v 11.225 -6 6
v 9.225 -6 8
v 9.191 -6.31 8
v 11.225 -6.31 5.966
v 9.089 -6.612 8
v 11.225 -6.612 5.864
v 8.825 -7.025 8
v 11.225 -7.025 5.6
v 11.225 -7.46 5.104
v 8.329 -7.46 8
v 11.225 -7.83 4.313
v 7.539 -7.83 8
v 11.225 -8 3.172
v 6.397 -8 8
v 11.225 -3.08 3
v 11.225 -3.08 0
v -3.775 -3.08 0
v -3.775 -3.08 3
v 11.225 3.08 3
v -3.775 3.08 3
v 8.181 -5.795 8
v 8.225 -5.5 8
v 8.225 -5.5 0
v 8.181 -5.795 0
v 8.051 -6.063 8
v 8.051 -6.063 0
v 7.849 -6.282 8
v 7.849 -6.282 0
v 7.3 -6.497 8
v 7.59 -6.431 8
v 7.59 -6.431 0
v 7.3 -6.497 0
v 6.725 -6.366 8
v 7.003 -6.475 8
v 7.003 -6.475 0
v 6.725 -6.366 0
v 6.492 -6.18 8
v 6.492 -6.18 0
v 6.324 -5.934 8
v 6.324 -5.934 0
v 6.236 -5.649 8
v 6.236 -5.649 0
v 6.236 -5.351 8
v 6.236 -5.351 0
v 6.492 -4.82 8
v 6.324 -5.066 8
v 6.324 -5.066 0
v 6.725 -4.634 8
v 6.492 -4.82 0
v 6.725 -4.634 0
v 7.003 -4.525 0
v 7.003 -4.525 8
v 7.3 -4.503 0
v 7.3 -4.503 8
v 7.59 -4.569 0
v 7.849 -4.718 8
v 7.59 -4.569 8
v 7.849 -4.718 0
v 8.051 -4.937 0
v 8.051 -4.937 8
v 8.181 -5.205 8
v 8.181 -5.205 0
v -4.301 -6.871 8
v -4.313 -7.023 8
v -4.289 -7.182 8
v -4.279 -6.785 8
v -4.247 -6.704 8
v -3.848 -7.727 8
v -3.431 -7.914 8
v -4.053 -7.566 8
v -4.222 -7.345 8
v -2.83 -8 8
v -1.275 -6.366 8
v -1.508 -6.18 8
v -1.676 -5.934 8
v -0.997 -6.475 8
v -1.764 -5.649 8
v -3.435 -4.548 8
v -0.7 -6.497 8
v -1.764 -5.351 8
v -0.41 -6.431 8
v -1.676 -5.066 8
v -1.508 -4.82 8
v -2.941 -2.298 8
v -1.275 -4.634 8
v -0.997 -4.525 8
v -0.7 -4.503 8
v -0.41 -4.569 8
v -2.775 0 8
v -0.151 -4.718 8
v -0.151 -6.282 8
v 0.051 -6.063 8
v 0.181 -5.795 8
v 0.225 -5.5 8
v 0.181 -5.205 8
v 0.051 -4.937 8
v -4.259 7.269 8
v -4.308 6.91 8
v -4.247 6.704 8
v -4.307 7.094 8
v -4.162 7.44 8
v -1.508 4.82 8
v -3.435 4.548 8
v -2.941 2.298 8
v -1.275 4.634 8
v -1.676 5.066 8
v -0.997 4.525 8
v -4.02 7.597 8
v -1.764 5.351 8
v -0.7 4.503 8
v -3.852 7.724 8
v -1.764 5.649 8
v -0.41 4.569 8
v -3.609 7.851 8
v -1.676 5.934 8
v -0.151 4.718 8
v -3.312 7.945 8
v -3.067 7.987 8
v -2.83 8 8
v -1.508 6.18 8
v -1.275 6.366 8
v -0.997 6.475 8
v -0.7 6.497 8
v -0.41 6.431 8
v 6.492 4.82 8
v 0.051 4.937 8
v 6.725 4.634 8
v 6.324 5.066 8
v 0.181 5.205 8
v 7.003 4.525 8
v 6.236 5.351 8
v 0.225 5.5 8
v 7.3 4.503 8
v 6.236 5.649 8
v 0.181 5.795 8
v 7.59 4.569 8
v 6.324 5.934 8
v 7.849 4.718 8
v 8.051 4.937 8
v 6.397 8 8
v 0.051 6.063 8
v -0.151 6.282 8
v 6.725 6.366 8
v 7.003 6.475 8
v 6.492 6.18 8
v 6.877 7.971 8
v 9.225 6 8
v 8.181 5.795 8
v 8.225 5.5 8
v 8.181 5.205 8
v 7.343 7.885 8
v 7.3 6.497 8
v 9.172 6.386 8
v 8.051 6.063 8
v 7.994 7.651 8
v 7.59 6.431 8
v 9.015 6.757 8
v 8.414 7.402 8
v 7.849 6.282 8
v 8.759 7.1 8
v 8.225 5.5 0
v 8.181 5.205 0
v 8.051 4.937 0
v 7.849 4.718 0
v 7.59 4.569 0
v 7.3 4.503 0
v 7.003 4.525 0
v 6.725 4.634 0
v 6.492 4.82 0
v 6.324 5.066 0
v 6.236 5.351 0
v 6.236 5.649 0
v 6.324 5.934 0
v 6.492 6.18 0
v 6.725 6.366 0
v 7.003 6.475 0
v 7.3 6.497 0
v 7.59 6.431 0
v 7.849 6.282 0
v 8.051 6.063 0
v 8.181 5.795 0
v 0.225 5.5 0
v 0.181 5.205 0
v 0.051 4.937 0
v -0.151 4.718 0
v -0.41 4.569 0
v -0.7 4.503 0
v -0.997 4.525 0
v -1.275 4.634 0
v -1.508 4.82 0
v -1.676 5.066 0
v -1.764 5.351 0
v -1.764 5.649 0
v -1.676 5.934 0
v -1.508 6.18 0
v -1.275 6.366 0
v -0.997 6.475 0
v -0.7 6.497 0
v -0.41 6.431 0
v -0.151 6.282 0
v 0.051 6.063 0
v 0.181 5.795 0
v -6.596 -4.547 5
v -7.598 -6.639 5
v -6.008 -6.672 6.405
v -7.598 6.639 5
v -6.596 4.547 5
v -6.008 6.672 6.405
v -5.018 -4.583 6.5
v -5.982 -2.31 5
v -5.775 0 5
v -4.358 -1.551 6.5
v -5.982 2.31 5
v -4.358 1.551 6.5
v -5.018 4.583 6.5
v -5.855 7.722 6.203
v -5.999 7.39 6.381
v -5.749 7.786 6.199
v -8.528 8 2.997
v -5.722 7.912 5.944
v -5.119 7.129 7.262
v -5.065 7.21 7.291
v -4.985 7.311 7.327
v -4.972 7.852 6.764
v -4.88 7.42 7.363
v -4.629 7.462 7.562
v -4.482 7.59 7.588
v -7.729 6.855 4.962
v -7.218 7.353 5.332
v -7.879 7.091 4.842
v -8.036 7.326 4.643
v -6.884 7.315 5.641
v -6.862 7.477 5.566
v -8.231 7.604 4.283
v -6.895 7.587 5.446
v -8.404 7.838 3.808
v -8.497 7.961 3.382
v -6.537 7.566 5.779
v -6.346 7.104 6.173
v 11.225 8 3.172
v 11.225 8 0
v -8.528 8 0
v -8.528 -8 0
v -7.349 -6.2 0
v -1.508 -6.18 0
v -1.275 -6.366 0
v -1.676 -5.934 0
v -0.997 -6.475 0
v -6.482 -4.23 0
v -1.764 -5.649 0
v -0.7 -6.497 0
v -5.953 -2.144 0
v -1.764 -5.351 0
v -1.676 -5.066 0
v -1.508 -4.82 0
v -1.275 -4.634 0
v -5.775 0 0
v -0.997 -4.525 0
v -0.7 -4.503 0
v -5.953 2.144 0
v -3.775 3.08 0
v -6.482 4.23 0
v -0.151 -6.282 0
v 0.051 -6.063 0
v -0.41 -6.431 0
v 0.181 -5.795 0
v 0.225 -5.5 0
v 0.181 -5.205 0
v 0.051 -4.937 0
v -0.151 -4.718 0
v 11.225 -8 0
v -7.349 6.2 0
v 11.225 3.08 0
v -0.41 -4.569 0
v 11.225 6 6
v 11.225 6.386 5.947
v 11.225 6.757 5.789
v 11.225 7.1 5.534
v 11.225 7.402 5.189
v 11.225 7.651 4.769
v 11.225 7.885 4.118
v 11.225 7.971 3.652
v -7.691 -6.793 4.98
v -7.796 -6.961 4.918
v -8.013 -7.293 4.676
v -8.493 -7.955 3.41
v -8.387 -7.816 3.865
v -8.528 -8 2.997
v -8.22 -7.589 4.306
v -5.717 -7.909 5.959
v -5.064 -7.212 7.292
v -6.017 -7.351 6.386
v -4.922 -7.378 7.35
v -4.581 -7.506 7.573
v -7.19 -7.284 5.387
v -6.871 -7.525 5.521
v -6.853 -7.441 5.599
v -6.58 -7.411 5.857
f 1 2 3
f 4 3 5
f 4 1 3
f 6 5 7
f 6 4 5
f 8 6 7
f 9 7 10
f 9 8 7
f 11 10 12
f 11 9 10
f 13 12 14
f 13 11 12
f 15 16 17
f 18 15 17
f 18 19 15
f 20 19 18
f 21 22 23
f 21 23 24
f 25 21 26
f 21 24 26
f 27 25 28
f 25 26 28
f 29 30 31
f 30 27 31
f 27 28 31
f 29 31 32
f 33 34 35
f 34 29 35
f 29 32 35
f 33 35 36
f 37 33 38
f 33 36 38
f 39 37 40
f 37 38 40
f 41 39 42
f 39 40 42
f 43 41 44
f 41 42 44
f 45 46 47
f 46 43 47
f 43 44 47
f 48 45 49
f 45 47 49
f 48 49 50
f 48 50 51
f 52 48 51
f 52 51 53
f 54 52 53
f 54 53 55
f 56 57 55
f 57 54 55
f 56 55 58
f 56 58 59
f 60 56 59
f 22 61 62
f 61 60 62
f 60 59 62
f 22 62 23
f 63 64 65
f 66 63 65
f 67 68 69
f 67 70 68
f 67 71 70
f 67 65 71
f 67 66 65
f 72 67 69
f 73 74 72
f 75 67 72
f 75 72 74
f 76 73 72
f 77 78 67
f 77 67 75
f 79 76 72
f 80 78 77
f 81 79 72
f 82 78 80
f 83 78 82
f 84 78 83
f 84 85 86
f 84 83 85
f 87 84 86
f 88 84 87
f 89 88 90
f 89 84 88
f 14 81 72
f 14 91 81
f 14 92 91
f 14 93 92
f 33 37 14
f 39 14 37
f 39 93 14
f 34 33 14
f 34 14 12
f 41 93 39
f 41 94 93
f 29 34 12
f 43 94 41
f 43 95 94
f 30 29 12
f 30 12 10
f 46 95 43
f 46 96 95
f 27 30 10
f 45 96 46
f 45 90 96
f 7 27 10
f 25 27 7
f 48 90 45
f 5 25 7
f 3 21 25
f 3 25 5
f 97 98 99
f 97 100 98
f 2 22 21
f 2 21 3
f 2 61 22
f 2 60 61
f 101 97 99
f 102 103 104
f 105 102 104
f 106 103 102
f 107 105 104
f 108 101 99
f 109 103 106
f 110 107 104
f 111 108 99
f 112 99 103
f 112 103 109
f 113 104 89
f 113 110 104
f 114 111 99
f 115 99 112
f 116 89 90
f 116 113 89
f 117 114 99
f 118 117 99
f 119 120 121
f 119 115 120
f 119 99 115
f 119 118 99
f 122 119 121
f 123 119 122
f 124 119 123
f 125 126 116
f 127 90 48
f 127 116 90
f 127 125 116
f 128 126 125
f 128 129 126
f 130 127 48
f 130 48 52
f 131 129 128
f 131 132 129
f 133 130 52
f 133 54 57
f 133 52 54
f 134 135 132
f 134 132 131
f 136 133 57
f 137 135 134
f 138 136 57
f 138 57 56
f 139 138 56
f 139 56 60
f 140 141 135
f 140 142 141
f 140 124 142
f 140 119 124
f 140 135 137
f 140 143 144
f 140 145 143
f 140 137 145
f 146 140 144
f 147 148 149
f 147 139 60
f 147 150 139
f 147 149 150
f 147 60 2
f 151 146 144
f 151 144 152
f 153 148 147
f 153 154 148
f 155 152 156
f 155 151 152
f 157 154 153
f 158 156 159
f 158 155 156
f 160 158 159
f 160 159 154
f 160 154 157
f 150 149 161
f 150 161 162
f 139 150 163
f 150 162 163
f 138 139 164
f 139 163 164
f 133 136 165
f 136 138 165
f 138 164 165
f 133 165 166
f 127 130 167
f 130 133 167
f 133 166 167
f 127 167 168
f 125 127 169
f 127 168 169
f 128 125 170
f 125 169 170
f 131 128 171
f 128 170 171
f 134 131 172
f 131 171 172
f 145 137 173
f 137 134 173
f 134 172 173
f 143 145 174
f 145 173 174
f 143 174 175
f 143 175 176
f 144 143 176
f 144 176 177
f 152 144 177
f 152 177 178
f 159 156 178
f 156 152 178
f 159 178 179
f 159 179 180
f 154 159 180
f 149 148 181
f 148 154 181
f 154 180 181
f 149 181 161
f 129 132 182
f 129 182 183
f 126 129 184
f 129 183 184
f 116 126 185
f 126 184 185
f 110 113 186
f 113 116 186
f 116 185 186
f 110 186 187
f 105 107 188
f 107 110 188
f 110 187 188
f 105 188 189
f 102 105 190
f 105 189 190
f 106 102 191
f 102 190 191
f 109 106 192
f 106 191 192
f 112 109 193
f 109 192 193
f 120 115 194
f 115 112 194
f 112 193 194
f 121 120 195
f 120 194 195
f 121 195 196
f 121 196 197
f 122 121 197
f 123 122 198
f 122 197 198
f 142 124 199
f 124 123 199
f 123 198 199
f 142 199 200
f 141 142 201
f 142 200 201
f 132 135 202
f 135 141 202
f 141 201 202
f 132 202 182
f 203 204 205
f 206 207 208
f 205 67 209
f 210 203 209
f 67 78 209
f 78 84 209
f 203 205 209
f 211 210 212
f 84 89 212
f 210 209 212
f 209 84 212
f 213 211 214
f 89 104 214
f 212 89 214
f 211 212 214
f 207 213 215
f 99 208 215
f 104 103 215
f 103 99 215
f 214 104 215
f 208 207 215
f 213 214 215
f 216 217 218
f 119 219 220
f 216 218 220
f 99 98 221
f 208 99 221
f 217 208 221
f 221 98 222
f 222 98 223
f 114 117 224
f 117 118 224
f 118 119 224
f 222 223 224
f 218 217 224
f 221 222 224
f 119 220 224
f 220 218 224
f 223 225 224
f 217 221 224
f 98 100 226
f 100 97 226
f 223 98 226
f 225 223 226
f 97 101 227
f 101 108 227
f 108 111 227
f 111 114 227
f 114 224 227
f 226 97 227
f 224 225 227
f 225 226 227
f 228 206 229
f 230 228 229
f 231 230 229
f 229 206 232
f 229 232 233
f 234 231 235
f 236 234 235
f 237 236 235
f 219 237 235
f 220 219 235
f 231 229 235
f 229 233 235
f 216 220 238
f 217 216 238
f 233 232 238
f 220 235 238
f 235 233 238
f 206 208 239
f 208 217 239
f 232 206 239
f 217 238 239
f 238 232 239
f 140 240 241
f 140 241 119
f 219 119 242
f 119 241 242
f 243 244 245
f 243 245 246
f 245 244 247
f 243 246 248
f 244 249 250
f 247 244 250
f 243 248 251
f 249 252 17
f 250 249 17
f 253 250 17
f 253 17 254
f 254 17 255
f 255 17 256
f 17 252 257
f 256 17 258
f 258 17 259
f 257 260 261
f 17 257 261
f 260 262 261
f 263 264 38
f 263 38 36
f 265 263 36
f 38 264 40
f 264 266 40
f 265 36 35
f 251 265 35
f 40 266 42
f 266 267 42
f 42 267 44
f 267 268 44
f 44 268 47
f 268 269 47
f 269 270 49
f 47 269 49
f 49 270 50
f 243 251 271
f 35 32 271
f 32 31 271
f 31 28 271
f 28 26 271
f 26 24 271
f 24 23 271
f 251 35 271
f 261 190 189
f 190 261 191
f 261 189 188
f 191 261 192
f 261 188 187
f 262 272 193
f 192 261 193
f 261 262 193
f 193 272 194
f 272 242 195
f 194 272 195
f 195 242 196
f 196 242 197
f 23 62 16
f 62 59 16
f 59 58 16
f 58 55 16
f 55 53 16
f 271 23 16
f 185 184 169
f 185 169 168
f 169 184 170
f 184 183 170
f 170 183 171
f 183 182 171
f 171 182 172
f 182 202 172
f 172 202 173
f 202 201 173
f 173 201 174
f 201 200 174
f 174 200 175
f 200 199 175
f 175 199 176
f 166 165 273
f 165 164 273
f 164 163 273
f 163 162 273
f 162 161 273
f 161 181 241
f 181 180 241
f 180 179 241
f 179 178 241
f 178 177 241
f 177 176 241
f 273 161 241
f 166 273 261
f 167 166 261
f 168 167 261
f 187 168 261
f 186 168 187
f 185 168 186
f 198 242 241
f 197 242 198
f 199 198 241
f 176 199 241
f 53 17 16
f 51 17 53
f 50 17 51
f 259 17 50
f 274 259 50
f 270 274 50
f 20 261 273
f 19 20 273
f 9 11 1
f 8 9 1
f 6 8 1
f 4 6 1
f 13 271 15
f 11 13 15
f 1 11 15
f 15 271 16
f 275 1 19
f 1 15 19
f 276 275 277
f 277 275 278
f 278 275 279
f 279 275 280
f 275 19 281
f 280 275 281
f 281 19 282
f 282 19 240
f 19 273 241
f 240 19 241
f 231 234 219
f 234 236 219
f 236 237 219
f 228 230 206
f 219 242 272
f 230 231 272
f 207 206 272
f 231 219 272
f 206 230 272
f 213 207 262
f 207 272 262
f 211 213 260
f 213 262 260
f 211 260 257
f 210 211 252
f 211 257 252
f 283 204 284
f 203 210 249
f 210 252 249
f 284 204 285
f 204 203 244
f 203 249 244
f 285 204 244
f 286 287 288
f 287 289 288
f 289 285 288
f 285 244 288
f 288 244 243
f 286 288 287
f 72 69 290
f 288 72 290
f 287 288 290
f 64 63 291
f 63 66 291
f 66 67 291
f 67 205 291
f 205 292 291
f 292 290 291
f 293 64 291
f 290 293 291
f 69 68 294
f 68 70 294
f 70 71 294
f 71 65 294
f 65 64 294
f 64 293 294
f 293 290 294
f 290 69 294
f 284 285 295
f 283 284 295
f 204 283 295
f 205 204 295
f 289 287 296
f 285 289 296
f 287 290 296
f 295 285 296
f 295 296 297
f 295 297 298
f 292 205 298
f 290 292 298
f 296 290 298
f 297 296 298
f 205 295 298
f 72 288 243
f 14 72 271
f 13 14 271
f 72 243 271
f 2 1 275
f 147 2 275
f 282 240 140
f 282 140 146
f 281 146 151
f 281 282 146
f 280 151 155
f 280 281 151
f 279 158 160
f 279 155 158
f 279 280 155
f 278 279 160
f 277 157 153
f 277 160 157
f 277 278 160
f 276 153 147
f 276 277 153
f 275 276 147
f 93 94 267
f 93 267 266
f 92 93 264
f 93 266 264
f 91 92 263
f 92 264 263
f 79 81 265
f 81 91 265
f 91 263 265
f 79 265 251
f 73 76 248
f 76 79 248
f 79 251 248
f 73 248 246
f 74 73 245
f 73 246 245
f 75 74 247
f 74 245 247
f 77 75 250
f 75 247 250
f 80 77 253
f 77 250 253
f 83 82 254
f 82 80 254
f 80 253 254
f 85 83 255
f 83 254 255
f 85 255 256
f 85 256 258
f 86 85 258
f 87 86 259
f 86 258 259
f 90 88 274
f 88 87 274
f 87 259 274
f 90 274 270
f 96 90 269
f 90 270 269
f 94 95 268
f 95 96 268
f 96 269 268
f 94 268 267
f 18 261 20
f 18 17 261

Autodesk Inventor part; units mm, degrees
ref_plane "YZ Plane" through (0, 0, 0) normal (1, 0, 0) x (0, 1, 0)
ref_plane "XZ Plane" through (0, 0, 0) normal (0, 1, 0) x (-1, 0, 0)
ref_plane "XY Plane" through (0, 0, 0) normal (0, 0, 1) x (1, 0, 0)
sketch "Sketch1" plane through (0, 0, 0) normal (0, 0, 1) x (1, 0, 0)
  circle A0 centre (-0.7749, 5.5) radius 1 projected
  circle A1 centre (7.2251, 5.5) radius 1 projected
  circle A2 centre (-0.7749, -5.5) radius 1 projected
  circle A3 centre (7.2251, -5.5) radius 1 projected
  line L0 (11.2251, -3) -> (-3.7749, -3) projected
  line L1 (-3.7749, -3) -> (-3.7749, 3) projected
  line L2 (-3.7749, 3) -> (11.2251, 3) projected
  line L3 (11.2251, 3) -> (11.2251, 8) projected
  line L4 (11.2251, 8) -> (-8.528, 8) projected
  arc A4 (-8.528, -8) -> (-8.528, 8) centre (-18.7749, 0) ccw projected
  line L5 (-8.528, -8) -> (11.2251, -8) projected
  line L6 (11.2251, -8) -> (11.2251, -3) projected
  point P0 (0, 0)
extrude "Extrusion1" add sketch "Sketch1" along normal blind 3
sketch "Sketch2" plane through (0, 0, 3) normal (0, 0, 1) x (1, 0, 0)
  line L0 (11.2251, -8) -> (11.2251, -3) projected
  line L1 (11.2251, -3) -> (-3.7749, -3) projected
  line L2 (-3.7749, -3) -> (-3.7749, 3) projected
  line L3 (-3.7749, 3) -> (11.2251, 3) projected
  line L4 (11.2251, 3) -> (11.2251, 8) projected
  line L5 (11.2251, 8) -> (-8.528, 8) projected
  arc A0 (-8.528, -8) -> (-8.528, 8) centre (-18.7749, 0) ccw projected
  line L6 (-8.528, -8) -> (11.2251, -8) projected
  circle A1 centre (-0.7749, 5.5) radius 1 projected
  circle A2 centre (7.2251, 5.5) radius 1 projected
  circle A3 centre (-0.7749, -5.5) radius 1 projected
  circle A4 centre (7.2251, -5.5) radius 1 projected
  line L7 (11.2251, -8) -> (11.2251, -3) projected
  line L8 (11.2251, 3) -> (11.2251, 8) projected
  line L9 (11.2251, -8) -> (11.2251, 8)
  point P0 (0, 0)
extrude "Extrusion2" add sketch "Sketch2" along normal blind 5
chamfer "Chamfer1" distance 3 angle 45 1 edges at (-5.7749, 0, 8)
fillet "Fillet1" radius 1 2 edges at (-6.817, -8, 6.3872) (-6.817, 8, 6.3872)
chamfer "Chamfer2" distance 2 angle 45 1 edges at (11.2251, 0, 8)
fillet "Fillet2" radius 2 2 edges at (10.2251, -8, 7) (10.2251, 8, 7)
thicken "Thicken1" operation add thickness 0.08 both sides no extend neighbours yes toward (0, 1, 0) faces at (1.2251, 3, 1)
thicken "Thicken2" operation add thickness 0.08 both sides no extend neighbours yes toward (0, -1, 0) faces at (6.2251, -3, 1)
properties part number "armtip_2_mod"
